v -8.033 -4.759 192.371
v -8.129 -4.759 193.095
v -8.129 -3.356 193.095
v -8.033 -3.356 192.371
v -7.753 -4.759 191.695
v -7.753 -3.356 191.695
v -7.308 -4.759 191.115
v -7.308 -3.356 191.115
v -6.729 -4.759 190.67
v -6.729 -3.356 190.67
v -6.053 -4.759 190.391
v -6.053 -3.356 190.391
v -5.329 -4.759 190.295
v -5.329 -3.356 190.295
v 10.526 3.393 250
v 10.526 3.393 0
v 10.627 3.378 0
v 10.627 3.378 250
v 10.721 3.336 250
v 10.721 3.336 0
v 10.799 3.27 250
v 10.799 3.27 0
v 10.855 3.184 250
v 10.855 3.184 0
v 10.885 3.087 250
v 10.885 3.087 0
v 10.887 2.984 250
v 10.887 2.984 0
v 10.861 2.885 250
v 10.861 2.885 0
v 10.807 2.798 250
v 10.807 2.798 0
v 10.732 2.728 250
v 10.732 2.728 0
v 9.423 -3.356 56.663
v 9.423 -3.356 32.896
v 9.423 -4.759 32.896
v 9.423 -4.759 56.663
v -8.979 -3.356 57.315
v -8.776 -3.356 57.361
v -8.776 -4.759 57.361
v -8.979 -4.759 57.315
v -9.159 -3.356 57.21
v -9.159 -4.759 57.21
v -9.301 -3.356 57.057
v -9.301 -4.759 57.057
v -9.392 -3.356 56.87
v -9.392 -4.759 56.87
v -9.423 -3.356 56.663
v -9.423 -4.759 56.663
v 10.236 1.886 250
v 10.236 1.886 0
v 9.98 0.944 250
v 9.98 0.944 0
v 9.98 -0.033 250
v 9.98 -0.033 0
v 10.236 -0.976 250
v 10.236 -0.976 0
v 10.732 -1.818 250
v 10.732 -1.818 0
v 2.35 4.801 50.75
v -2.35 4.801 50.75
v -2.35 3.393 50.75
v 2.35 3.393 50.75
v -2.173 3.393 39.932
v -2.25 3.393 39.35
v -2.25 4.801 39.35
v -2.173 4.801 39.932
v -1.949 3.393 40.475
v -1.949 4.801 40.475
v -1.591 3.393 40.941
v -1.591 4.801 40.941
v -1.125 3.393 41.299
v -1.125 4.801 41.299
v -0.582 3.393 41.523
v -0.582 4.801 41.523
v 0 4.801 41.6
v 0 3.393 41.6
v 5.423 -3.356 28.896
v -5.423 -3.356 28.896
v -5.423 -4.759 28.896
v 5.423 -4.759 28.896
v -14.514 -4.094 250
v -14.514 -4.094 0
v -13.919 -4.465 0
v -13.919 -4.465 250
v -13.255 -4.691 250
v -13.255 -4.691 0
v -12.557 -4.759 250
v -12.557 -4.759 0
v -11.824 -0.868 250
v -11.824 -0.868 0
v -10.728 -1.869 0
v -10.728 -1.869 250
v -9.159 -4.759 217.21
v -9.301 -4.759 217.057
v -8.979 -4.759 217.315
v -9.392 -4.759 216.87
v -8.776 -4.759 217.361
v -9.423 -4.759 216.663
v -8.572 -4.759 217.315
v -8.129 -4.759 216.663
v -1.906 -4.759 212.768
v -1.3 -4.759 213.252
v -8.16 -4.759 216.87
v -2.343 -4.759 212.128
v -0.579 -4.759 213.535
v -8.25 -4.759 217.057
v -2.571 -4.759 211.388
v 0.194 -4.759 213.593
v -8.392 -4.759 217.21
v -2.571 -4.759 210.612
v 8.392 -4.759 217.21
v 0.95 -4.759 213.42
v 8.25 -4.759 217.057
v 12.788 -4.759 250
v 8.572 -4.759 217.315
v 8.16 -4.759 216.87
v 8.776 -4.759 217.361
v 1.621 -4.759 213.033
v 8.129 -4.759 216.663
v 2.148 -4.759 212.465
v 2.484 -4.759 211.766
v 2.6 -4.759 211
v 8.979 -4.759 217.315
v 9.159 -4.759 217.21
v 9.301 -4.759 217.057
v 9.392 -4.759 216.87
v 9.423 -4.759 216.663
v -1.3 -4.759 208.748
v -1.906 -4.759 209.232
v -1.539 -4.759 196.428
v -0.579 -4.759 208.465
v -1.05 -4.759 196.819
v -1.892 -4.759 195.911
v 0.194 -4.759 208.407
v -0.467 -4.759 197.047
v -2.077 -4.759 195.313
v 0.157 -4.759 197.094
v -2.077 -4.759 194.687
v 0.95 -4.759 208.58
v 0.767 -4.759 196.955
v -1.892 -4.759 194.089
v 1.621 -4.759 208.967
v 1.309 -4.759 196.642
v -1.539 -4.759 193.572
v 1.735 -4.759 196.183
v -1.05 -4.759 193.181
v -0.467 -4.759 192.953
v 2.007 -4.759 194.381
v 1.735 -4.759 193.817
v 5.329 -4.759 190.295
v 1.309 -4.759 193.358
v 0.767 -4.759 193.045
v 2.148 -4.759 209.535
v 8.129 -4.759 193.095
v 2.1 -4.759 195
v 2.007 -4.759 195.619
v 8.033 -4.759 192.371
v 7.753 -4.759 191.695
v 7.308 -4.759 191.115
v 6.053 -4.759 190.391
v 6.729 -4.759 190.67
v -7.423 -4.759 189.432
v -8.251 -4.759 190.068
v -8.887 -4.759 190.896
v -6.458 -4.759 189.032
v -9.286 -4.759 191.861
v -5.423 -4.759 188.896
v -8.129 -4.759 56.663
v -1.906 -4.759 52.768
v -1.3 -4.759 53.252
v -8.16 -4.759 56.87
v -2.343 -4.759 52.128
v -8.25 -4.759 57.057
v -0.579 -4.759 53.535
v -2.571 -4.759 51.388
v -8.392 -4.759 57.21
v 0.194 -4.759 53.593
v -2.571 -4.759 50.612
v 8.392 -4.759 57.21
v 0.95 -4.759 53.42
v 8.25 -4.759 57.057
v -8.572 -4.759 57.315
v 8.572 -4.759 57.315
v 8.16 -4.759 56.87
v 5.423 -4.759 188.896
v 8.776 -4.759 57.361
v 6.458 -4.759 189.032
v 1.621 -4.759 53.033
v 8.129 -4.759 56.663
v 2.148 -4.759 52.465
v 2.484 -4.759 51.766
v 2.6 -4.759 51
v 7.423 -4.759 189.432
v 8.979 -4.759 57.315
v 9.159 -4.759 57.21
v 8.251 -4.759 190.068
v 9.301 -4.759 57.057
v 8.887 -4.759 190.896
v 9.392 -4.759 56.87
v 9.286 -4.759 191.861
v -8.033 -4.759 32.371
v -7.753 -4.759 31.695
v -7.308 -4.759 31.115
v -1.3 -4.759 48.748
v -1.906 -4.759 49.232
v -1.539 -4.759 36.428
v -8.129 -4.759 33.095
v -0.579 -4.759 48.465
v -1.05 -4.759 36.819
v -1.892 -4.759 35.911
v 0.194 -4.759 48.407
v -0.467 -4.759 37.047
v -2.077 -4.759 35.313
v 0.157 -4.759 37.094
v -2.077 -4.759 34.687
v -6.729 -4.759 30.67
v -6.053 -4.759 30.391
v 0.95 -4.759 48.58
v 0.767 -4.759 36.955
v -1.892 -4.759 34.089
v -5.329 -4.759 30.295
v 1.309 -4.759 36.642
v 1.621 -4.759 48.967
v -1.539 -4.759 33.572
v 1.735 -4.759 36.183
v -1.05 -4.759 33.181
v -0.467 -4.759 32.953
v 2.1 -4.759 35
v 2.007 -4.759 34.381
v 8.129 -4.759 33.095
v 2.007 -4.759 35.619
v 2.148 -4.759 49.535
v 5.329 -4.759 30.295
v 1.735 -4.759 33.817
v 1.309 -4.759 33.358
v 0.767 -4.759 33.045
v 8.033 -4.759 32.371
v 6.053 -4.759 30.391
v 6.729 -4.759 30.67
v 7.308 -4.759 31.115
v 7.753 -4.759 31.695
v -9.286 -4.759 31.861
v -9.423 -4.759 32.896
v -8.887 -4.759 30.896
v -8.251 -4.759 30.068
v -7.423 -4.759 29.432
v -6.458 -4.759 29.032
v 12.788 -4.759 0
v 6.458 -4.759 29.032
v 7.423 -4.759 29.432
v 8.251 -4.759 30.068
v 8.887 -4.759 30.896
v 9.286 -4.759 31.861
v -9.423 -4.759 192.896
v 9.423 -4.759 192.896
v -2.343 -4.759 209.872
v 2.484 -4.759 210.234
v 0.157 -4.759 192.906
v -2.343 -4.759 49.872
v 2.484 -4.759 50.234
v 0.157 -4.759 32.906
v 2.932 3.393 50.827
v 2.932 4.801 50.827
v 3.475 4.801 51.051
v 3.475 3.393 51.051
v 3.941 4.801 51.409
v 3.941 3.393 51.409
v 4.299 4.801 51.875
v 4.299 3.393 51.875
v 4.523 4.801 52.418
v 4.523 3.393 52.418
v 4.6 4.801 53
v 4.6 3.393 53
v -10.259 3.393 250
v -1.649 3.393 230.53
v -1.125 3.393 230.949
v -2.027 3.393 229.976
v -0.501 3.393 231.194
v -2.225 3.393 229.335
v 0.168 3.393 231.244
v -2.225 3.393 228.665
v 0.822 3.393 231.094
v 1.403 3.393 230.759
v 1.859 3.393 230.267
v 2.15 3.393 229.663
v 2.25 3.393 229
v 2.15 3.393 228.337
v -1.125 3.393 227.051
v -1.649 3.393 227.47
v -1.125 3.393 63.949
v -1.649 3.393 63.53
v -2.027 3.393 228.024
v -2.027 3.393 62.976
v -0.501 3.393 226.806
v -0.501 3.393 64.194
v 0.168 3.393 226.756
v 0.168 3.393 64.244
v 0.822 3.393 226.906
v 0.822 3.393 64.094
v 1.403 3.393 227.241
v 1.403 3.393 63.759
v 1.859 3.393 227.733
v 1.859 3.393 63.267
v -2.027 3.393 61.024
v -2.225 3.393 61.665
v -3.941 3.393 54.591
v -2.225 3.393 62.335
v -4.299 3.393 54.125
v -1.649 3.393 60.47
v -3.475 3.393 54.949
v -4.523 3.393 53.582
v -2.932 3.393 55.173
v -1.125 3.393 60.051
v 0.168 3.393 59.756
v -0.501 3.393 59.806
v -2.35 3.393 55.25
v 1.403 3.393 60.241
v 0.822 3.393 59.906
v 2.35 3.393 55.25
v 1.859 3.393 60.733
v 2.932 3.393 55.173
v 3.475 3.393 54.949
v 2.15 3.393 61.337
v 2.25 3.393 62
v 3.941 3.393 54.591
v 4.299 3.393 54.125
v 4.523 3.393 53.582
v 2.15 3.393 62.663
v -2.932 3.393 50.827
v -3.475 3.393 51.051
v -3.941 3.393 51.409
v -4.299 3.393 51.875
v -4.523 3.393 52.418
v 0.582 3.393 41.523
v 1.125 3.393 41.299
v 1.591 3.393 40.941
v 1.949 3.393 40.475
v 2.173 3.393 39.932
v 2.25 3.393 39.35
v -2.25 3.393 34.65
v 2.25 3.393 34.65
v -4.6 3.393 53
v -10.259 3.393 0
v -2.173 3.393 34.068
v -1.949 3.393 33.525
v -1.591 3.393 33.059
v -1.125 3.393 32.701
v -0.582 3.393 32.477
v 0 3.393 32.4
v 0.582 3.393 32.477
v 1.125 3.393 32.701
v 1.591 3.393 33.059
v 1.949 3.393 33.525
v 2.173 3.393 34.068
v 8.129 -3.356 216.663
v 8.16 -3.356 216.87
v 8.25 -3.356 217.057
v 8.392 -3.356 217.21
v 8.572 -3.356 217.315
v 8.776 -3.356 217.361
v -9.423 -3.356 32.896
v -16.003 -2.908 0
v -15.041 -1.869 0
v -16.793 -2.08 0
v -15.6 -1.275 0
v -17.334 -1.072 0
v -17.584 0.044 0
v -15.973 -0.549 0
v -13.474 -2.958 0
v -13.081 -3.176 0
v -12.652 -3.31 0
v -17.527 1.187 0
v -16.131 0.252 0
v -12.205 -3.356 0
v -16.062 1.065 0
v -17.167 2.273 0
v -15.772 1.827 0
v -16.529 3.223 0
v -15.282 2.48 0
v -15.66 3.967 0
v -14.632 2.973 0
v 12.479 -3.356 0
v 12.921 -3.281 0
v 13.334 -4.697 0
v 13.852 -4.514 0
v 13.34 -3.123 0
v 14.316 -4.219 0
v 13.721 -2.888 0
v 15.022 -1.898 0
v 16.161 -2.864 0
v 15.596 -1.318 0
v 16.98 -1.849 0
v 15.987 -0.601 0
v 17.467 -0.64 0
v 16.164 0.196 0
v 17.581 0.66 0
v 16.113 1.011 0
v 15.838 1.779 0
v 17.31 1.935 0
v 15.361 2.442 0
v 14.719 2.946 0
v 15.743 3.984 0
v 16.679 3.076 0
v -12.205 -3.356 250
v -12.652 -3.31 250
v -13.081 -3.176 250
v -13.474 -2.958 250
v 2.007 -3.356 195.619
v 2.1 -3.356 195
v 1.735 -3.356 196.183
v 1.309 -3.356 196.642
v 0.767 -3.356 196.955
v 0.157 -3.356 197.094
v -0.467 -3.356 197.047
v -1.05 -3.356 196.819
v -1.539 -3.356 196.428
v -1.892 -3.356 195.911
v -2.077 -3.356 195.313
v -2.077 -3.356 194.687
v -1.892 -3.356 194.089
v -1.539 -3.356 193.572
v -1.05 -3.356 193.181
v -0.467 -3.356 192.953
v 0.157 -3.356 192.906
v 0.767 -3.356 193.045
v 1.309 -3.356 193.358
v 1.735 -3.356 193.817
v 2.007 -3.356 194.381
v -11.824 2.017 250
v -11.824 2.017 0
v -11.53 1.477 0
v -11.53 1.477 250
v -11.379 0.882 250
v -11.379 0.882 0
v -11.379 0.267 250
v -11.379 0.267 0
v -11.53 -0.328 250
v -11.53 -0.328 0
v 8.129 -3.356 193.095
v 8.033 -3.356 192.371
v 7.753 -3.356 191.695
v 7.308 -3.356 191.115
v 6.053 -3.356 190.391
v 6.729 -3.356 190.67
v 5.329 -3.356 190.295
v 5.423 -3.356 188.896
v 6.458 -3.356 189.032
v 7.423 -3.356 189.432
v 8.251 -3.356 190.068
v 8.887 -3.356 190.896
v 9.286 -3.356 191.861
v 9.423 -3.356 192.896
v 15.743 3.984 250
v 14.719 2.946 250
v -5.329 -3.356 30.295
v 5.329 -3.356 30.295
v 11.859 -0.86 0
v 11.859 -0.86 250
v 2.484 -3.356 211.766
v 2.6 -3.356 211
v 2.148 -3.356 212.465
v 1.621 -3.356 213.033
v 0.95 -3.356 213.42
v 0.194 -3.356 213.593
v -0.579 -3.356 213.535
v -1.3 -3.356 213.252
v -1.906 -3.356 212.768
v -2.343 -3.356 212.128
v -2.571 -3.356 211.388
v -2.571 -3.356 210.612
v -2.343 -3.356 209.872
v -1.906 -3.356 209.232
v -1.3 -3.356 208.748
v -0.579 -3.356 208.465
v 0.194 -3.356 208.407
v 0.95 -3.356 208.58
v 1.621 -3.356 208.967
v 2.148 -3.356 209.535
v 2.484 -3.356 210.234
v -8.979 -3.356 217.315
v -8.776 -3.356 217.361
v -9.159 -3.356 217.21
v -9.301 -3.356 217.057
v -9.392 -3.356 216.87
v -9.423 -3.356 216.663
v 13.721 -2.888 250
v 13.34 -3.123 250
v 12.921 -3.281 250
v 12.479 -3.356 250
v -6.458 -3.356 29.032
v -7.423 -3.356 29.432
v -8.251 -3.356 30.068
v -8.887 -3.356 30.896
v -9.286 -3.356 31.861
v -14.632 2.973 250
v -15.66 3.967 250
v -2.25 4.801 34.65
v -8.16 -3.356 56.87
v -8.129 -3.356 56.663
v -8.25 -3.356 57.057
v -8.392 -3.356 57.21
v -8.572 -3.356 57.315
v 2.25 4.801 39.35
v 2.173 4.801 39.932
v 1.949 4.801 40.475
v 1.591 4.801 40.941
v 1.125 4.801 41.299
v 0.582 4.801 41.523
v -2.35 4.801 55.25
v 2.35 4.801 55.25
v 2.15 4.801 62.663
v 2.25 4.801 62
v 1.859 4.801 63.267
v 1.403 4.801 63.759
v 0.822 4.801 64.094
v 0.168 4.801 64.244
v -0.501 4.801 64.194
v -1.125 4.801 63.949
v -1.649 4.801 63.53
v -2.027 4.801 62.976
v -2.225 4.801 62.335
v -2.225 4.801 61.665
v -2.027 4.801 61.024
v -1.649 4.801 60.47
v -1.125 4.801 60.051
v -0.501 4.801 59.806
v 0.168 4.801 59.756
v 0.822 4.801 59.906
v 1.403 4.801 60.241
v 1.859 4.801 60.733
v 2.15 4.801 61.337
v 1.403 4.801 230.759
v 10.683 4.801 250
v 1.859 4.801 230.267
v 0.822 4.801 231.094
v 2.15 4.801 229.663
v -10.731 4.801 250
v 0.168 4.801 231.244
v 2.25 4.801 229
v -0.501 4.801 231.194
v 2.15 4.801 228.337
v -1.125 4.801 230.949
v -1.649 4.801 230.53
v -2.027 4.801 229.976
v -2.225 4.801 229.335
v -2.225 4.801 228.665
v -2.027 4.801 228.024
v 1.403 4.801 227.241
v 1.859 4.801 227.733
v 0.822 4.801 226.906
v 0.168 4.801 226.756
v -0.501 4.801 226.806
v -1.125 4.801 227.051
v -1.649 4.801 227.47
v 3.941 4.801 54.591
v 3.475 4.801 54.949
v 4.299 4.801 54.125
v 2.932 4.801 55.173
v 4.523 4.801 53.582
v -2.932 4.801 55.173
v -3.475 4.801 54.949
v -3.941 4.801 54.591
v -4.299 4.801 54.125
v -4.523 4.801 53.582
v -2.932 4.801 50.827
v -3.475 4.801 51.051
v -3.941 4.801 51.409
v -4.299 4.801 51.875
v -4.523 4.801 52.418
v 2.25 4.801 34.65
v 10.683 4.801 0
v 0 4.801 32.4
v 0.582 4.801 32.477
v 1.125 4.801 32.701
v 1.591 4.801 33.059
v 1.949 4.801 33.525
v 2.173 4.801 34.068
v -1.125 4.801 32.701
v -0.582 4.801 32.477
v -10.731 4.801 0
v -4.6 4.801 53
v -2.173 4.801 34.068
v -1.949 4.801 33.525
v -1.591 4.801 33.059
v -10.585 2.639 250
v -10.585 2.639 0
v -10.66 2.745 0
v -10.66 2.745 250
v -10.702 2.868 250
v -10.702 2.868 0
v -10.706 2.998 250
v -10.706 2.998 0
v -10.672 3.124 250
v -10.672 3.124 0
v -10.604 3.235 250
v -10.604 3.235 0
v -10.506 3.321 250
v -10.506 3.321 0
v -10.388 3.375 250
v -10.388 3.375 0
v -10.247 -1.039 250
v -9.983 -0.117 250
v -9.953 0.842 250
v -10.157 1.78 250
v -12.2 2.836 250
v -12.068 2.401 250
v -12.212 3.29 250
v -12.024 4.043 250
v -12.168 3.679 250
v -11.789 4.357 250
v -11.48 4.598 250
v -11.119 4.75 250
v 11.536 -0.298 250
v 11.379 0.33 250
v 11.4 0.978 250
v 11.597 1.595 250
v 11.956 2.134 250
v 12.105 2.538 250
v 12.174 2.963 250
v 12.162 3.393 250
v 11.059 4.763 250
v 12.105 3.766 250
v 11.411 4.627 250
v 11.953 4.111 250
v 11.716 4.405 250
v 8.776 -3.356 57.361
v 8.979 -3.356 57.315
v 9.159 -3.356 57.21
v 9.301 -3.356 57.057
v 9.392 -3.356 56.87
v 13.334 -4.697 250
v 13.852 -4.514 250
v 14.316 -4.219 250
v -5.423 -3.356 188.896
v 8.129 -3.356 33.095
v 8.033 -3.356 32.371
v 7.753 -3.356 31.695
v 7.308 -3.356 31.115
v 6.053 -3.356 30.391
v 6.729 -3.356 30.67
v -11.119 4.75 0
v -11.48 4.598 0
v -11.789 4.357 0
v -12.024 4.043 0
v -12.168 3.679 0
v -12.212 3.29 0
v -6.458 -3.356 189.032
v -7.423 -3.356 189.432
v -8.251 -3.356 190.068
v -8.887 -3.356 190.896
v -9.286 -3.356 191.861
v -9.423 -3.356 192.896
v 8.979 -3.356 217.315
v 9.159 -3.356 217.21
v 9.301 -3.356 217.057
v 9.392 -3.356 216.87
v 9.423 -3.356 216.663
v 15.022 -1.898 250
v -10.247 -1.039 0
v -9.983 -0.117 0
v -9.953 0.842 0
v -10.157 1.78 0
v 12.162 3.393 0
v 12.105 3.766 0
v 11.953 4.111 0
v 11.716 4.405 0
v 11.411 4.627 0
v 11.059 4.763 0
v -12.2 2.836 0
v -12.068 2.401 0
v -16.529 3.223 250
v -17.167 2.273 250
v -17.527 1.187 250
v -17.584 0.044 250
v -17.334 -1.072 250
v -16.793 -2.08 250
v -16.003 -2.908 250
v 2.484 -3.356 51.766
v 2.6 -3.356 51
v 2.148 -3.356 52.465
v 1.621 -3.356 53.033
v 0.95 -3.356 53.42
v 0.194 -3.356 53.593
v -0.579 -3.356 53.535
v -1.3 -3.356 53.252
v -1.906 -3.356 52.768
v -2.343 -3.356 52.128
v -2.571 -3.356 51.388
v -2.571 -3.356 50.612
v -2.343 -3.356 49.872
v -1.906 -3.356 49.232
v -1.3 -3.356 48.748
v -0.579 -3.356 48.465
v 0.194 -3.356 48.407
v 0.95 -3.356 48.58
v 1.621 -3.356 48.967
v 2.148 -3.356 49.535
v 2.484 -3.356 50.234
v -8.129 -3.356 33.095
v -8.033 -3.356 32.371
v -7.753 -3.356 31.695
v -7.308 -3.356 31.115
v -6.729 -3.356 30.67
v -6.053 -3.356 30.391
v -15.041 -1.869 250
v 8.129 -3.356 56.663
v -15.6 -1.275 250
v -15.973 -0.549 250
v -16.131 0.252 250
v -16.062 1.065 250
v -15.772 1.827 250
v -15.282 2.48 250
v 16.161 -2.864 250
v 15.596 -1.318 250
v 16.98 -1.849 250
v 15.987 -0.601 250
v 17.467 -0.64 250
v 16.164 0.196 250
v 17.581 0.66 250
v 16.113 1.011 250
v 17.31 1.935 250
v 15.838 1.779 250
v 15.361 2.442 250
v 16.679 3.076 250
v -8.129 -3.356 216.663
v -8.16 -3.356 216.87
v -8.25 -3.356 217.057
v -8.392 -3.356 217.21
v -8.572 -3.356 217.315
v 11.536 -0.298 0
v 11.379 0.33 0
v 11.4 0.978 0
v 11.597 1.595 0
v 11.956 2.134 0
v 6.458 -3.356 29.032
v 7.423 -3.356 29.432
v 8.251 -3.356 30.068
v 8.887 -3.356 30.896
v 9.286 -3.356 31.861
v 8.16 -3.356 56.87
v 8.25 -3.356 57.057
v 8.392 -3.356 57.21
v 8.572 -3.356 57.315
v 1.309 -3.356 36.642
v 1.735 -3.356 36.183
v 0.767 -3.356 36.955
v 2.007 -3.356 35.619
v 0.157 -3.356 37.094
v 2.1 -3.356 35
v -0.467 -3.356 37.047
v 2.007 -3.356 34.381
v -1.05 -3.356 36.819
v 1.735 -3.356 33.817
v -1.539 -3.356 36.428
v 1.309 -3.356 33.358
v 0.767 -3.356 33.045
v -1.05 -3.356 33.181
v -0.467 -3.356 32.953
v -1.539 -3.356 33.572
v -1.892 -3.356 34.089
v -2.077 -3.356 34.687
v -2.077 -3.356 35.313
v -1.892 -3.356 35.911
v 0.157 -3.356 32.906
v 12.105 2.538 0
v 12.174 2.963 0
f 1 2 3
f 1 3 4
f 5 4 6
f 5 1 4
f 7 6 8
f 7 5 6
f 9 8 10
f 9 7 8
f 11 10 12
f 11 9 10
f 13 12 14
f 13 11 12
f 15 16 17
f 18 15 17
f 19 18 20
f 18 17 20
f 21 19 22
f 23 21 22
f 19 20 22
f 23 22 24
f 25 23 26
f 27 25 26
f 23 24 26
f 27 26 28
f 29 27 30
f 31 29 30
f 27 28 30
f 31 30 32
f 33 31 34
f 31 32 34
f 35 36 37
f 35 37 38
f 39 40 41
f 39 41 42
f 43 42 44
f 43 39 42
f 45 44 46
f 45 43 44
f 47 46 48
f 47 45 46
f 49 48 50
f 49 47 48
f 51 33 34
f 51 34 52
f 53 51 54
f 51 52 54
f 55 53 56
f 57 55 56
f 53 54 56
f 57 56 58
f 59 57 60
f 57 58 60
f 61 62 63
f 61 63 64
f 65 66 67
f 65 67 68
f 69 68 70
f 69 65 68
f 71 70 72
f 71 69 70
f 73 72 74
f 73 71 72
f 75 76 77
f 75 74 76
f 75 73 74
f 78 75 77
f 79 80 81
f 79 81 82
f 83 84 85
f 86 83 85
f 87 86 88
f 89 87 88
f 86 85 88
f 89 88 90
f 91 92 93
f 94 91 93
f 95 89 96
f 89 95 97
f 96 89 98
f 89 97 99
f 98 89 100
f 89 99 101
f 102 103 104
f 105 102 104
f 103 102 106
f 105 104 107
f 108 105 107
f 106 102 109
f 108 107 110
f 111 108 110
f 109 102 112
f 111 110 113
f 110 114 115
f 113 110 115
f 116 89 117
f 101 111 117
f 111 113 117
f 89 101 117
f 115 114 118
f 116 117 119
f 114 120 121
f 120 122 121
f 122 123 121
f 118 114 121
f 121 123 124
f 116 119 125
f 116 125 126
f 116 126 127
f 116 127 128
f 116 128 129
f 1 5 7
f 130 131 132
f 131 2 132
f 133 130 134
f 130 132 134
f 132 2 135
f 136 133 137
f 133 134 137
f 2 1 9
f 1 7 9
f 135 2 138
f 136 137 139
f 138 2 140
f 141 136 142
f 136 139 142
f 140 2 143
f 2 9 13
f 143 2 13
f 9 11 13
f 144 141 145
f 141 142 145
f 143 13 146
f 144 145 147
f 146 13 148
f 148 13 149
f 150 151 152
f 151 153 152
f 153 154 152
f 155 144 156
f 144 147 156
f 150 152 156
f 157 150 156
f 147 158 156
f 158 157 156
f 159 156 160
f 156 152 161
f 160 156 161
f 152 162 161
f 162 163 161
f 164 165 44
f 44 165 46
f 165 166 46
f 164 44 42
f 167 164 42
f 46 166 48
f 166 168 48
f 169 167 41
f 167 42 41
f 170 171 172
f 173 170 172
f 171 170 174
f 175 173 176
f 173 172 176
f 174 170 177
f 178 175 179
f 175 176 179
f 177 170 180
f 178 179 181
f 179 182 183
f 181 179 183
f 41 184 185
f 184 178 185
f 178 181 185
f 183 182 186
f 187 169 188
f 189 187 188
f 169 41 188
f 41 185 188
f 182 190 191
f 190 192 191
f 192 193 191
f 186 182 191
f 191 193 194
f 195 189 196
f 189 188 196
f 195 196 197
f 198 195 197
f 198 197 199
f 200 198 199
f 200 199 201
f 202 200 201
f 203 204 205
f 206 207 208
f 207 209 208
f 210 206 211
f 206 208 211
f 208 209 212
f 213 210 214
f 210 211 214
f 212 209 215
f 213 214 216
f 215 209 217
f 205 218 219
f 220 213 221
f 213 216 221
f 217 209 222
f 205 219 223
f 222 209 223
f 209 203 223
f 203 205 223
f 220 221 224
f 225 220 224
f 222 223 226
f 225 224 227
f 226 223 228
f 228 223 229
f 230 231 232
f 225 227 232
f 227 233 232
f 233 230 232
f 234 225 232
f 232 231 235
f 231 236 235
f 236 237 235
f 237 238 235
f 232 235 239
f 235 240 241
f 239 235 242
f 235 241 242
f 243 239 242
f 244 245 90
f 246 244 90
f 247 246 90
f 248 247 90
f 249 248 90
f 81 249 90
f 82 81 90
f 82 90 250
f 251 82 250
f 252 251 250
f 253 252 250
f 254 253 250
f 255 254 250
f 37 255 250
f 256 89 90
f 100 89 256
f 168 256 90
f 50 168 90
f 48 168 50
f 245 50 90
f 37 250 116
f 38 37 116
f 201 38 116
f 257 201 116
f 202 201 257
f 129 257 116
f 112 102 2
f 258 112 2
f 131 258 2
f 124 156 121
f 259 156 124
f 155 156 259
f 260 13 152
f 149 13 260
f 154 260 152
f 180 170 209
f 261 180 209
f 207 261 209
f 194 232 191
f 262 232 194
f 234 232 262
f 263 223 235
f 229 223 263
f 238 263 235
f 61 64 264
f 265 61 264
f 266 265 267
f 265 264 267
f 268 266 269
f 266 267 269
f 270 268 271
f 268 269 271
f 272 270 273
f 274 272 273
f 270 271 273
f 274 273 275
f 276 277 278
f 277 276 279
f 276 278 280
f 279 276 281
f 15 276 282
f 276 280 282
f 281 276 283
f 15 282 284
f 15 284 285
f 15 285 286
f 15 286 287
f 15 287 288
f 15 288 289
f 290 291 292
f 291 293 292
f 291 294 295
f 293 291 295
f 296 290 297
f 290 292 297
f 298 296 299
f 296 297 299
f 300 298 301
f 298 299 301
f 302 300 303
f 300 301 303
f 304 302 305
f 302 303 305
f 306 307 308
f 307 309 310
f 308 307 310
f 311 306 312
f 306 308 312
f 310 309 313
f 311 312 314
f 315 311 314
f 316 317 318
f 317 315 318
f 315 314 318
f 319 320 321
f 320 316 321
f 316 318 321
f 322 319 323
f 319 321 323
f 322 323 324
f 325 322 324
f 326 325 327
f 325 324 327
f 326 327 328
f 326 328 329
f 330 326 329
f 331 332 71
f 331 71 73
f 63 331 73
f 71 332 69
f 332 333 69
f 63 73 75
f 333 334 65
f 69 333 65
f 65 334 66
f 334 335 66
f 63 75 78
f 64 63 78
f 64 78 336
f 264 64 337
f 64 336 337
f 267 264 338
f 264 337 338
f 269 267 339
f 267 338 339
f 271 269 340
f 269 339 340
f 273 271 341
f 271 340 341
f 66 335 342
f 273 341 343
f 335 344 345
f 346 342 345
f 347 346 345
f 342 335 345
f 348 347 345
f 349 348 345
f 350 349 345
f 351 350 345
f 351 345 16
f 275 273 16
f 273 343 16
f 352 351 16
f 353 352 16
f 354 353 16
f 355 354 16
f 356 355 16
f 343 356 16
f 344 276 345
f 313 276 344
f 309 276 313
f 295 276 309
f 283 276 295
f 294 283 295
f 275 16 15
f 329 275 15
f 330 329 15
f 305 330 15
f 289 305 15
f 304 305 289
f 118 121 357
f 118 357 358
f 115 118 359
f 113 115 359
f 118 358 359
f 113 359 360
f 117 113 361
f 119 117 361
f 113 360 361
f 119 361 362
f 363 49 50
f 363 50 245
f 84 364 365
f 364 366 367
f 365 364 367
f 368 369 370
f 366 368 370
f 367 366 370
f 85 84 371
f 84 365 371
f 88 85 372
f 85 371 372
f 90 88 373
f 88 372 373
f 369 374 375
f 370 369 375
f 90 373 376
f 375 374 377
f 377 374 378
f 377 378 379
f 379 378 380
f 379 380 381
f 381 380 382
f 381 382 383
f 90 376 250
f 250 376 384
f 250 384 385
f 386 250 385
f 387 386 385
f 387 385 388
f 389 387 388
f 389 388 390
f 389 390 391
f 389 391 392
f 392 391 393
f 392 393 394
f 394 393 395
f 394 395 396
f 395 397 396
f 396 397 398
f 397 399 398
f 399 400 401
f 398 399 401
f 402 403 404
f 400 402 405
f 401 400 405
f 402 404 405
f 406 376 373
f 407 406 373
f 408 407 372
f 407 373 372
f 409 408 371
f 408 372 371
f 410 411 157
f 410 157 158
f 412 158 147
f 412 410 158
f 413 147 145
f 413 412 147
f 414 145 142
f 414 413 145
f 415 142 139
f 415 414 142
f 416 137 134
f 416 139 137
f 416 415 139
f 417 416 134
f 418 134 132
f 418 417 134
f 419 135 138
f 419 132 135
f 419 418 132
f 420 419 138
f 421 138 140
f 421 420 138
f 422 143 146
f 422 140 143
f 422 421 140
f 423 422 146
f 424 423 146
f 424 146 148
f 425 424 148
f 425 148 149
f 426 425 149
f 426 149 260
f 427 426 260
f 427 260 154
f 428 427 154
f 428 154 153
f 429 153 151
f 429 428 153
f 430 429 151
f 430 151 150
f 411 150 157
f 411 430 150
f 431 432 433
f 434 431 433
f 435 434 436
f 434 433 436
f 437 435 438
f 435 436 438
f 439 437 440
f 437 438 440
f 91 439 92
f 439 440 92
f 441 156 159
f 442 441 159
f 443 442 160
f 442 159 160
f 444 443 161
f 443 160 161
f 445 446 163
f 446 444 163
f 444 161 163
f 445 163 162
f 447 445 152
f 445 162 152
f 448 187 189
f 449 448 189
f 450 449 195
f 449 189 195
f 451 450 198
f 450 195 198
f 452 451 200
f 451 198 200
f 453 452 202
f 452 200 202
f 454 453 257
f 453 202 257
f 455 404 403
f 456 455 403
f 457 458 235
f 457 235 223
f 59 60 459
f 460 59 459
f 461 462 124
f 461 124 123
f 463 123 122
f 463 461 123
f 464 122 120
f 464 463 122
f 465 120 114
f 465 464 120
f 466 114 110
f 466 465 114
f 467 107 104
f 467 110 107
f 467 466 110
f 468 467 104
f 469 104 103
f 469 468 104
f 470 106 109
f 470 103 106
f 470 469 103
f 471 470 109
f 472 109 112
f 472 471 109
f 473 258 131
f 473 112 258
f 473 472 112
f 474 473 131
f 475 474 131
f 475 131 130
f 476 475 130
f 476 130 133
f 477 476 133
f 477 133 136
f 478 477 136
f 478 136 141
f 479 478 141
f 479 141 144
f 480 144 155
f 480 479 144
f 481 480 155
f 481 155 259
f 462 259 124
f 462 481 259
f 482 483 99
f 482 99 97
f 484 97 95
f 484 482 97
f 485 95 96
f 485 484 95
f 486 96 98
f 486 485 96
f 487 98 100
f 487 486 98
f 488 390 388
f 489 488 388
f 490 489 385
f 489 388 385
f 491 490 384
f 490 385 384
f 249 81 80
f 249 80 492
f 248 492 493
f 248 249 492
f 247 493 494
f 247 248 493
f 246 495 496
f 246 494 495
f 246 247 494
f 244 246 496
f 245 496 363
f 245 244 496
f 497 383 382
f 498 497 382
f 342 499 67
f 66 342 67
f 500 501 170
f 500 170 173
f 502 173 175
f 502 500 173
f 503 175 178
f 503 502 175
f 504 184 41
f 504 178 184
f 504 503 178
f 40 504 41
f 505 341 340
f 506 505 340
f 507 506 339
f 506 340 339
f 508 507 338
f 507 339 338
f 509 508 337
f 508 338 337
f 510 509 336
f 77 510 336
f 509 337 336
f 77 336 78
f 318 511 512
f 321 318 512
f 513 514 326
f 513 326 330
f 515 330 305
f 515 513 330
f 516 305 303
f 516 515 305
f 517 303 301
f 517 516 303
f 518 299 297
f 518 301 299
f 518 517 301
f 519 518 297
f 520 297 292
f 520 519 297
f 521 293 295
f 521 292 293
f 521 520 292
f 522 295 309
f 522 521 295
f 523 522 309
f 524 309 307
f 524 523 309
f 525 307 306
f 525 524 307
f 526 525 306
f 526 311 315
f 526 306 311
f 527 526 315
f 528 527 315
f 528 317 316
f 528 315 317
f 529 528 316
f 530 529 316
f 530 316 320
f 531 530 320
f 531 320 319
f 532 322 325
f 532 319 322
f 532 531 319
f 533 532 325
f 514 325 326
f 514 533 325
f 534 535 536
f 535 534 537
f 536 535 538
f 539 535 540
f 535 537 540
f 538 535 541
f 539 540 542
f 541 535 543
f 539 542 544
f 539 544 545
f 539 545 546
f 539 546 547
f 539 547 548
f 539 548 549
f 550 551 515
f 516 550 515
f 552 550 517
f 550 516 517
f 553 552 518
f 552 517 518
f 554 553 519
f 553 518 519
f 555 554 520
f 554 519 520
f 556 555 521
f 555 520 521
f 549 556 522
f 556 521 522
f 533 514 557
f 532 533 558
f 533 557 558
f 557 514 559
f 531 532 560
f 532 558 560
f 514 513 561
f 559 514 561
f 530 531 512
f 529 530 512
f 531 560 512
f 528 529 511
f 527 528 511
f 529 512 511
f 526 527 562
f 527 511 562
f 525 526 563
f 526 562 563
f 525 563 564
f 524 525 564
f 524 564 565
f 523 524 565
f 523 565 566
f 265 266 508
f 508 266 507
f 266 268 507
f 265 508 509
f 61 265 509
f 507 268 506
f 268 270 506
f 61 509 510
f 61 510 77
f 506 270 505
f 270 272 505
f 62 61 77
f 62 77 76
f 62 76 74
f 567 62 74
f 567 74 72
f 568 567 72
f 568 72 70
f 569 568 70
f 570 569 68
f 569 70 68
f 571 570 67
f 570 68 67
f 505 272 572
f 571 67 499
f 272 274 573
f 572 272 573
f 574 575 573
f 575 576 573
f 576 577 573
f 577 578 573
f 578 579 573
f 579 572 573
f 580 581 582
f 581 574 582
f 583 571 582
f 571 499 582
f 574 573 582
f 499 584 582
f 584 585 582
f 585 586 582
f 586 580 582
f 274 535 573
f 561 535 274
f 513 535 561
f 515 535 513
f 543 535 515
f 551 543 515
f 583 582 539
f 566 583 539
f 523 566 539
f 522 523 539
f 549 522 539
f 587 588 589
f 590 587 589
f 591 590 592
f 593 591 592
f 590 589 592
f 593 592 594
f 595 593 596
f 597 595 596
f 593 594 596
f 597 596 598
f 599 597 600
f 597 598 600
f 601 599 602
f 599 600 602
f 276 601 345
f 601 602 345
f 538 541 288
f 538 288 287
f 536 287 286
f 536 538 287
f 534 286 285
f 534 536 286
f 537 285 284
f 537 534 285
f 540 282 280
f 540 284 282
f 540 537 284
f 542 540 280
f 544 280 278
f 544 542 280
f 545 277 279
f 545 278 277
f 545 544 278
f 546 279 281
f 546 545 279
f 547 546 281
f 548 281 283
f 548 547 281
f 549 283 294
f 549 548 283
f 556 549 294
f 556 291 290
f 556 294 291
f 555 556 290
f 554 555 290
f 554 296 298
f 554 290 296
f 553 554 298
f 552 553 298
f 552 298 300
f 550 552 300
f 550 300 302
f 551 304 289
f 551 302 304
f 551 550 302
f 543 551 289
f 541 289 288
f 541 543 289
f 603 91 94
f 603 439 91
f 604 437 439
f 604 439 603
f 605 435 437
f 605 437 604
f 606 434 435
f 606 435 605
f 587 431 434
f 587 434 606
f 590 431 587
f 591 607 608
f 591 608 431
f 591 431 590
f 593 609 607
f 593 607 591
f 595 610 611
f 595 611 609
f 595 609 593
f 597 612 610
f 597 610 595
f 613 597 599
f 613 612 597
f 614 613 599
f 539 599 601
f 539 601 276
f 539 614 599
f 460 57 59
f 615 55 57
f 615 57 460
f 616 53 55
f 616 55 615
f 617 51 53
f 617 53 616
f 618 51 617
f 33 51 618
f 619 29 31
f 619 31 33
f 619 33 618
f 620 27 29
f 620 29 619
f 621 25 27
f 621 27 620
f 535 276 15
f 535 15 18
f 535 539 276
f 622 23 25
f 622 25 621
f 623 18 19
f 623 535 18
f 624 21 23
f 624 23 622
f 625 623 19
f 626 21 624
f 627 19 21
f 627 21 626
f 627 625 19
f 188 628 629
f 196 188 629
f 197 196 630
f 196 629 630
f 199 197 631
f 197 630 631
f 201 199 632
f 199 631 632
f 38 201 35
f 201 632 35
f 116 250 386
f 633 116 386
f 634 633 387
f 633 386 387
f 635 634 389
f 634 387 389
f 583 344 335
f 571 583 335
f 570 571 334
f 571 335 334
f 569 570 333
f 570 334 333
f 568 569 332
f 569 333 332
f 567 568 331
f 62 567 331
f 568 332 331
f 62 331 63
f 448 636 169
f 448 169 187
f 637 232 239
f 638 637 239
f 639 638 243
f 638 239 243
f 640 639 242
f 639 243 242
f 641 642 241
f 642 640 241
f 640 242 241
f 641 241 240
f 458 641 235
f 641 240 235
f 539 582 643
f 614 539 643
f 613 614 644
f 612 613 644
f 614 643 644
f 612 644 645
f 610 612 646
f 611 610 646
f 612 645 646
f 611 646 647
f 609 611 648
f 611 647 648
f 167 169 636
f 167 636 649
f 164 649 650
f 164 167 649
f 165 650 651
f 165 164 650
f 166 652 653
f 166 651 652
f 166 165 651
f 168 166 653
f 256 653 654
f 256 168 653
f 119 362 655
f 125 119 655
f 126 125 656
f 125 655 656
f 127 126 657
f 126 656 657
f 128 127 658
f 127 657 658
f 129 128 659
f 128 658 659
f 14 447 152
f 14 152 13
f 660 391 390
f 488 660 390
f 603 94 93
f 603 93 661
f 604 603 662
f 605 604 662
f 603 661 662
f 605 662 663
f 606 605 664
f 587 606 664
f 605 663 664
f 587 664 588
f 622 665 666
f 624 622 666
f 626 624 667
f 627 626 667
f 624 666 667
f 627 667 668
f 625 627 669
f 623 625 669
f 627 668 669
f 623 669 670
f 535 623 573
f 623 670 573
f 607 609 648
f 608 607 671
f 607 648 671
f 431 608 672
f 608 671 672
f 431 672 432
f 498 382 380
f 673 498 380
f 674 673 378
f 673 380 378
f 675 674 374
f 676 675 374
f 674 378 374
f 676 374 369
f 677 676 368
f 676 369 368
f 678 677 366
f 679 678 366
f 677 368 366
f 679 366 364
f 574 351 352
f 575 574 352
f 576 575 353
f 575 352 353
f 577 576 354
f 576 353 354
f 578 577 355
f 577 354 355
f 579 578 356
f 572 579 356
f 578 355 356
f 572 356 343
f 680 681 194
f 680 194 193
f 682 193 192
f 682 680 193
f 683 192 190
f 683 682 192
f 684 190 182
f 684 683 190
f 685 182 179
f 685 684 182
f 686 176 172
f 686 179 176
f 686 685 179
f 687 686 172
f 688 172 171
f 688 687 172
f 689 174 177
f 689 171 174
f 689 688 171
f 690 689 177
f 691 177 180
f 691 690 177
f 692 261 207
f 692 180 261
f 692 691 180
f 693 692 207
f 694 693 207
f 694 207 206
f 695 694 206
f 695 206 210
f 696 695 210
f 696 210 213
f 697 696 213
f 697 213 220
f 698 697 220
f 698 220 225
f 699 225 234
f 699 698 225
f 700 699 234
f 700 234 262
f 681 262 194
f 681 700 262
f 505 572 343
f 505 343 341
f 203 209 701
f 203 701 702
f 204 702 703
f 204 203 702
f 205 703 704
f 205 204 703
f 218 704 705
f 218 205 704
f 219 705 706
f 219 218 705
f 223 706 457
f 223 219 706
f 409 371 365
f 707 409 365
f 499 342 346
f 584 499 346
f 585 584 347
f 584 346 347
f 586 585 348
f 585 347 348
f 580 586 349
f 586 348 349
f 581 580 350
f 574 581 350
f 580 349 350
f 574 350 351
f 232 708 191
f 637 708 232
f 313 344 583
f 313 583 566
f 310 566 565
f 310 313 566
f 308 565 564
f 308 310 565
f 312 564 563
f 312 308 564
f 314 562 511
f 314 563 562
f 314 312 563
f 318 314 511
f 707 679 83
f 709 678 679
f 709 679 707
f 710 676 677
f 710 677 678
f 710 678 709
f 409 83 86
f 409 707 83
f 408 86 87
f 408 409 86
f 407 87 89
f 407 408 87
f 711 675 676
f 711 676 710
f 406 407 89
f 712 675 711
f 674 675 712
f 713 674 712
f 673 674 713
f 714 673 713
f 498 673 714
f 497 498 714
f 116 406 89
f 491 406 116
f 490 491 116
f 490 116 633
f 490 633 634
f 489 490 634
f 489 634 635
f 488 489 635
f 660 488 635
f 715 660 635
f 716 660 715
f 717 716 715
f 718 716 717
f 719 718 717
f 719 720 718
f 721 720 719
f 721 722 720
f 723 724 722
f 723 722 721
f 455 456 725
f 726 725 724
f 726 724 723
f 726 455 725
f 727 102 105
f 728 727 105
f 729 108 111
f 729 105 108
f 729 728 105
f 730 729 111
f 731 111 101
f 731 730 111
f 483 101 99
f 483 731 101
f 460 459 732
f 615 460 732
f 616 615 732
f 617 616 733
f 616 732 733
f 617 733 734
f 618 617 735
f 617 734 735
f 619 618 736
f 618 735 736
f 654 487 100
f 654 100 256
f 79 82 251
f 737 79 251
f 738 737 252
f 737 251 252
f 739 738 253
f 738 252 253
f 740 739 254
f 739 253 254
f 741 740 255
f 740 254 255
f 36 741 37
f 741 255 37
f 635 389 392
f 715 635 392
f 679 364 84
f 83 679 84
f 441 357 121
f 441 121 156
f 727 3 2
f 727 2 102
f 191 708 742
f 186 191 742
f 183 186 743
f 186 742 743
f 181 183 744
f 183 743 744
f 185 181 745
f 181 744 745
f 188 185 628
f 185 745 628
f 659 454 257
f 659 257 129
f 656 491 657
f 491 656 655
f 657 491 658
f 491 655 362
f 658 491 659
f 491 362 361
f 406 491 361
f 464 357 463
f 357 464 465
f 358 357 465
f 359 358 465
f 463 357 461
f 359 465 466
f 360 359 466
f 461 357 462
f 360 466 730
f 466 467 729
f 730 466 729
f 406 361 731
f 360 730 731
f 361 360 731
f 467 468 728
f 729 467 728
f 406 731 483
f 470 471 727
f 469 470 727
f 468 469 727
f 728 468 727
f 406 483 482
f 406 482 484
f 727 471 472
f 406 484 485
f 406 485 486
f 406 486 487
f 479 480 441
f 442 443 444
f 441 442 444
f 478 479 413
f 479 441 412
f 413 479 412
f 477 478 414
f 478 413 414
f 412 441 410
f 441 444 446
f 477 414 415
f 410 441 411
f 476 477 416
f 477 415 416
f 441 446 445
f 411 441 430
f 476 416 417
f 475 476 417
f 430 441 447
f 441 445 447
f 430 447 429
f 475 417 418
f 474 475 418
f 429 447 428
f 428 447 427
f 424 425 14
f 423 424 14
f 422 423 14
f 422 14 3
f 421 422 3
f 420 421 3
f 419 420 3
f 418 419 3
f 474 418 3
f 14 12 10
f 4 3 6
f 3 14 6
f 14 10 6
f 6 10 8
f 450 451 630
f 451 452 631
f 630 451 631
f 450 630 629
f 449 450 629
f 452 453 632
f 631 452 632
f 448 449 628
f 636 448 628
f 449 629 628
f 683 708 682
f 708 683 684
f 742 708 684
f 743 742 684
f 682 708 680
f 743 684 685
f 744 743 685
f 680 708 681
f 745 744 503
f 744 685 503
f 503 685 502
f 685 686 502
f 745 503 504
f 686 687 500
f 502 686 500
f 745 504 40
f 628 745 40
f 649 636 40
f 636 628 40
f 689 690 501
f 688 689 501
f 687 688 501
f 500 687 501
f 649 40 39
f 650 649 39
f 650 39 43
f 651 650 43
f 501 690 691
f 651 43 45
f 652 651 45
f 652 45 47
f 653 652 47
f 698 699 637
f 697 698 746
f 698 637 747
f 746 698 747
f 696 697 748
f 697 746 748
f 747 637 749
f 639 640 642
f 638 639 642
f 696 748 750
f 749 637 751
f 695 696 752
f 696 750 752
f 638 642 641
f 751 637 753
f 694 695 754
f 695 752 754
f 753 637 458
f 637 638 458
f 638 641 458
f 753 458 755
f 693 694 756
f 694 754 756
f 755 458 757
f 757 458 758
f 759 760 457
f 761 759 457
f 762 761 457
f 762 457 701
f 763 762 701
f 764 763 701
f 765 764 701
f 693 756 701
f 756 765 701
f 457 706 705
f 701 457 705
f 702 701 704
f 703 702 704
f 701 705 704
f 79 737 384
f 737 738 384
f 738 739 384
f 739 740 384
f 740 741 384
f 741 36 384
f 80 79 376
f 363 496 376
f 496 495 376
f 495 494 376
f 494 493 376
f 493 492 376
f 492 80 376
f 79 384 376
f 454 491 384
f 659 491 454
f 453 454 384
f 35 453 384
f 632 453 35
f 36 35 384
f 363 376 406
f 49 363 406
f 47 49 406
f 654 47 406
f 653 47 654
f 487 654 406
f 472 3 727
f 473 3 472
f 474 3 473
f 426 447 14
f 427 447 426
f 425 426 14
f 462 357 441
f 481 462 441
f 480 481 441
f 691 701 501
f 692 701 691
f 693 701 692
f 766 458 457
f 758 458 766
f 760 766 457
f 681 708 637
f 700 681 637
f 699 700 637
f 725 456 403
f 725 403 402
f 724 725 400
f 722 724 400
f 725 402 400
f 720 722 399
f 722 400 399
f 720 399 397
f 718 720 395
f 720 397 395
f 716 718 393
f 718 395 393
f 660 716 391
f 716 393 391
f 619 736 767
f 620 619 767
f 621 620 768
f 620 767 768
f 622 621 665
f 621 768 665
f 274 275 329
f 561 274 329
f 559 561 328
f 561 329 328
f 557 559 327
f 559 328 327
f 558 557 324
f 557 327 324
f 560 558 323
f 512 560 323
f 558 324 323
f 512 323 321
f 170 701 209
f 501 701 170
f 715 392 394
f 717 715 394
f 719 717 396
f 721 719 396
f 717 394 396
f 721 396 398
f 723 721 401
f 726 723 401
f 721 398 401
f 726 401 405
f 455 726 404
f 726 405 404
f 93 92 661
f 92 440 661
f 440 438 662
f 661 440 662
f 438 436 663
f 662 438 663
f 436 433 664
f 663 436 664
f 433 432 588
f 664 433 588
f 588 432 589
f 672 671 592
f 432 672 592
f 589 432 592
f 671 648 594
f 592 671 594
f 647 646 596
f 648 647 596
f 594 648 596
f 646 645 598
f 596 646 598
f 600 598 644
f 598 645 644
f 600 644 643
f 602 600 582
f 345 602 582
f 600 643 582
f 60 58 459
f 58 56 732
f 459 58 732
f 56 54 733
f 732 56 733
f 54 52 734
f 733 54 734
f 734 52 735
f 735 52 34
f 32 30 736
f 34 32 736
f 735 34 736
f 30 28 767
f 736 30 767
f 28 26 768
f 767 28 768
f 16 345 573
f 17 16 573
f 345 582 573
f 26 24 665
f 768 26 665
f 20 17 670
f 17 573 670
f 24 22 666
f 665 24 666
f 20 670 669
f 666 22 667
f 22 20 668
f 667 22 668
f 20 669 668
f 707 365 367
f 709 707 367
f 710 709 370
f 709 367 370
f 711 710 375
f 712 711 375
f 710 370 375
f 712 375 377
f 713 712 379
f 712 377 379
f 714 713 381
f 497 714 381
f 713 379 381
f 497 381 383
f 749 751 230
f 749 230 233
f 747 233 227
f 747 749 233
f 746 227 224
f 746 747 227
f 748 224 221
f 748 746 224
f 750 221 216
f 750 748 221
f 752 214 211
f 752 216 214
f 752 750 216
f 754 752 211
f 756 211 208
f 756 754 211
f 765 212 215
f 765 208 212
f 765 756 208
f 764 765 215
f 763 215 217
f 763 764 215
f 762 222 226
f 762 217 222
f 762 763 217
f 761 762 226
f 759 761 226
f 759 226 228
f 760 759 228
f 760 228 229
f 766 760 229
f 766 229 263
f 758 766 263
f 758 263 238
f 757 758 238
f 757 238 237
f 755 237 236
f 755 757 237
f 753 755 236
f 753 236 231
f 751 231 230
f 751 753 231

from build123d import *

# Parameters (mm, degrees)
F2_DEPTH     = 250
F3_DEPTH     = 250
F4_W         = 4.5
F4_H         = 9.2
F5_DEPTH     = 25
F4_W_2       = 9.2
F4_H_2       = 4.5
F4_R         = 2.25
F8_R         = 2.24999
F8_2_R       = 2.24999
F14_DEPTH    = 6
F13_R        = 2.1
F13_R_2      = 2.6
F15_R        = 4
F16_R        = 2.8
F17_T1_DEPTH = 9.5


# Not quite as in the source:
# - a fillet or chamfer that OpenCascade refuses, or shapes differently, is made with other operations: its cross-section is extruded or revolved along the edge and cut away or added
# - a fillet or chamfer is up to 0.001 mm smaller than in the source, because OpenCascade refuses the exact size


with BuildPart() as f2:
    # F1 (on Top) → F2 (new body)
    with BuildSketch(Plane.XY):
        with BuildLine():
            Line((-11.8238357827, -0.8677195292), (-10.7275778428, -1.8694410791))
            ThreePointArc((-10.7275778428, -1.8694410791), (-9.9382011717, 0.3618114698), (-10.5848610401, 2.6385271922))
            ThreePointArc((-10.5848610401, 2.6385271922), (-10.6721948967, 3.1240050413), (-10.2586513385, 3.3928873017))
            Line((-10.2586513385, 3.3928873017), (10.5257425457, 3.3928873017))
            ThreePointArc((10.5257425457, 3.3928873017), (10.8736199043, 3.1365507058), (10.731831193, 2.7283558156))
            ThreePointArc((10.731831193, 2.7283558156), (9.9471667751, 0.455322268), (10.731831193, -1.8177112797))
            Line((10.731831193, -1.8177112797), (11.8592558429, -0.8600065485))
            ThreePointArc((11.8592558429, -0.8600065485), (11.3668469211, 0.6546838766), (11.9562381878, 2.1343363915))
            ThreePointArc((11.9562381878, 2.1343363915), (12.1496041237, 2.7488216154), (12.1623268351, 3.3928873017))
            ThreePointArc((12.1623268351, 3.3928873017), (11.7162853066, 4.4052676185), (10.6833400205, 4.8013622873))
            Line((10.6833400205, 4.8013622873), (-10.7308318838, 4.8013622873))
            ThreePointArc((-10.7308318838, 4.8013622873), (-11.7888176914, 4.3568184571), (-12.2117670253, 3.2900162041))
            ThreePointArc((-12.2117670253, 3.2900162041), (-12.1485508104, 2.6137193167), (-11.8238357827, 2.0171173383))
            ThreePointArc((-11.8238357827, 2.0171173383), (-11.3595728447, 0.5746989045), (-11.8238357827, -0.8677195292))
        make_face()
    extrude(amount=F2_DEPTH)


with BuildPart() as f3:
    # F1 (on Top) → F3 (new body)
    with BuildSketch(Plane.XY):
        with BuildLine():
            ThreePointArc((-15.040784136, -1.8694410791), (-16.1252354526, 0.6606326234), (-14.6316215396, 2.9728664085))
            Line((-14.6316215396, 2.9728664085), (-15.6602784991, 3.9672353305))
            ThreePointArc((-15.6602784991, 3.9672353305), (-17.5947215903, 0.617735278), (-16.0031653941, -2.9076256324))
            Line((-16.0031653941, -2.9076256324), (-14.5143490806, -4.0940172111))
            ThreePointArc((-14.5143490806, -4.0940172111), (-13.5937394916, -4.5972187997), (-12.5571619719, -4.7592092305))
            Line((-12.5571619719, -4.7592092305), (12.7876326442, -4.7592092305))
            ThreePointArc((12.7876326442, -4.7592092305), (13.5980508192, -4.6201771633), (14.3157895654, -4.21898067))
            Line((14.3157895654, -4.21898067), (16.1611102521, -2.863822272))
            ThreePointArc((16.1611102521, -2.863822272), (17.5805681578, 0.6595379776), (15.7430302352, 3.9840503596))
            Line((15.7430302352, 3.9840503596), (14.7194536403, 2.9460568912))
            ThreePointArc((14.7194536403, 2.9460568912), (16.1669970409, 0.6050832532), (15.0222023949, -1.8979118904))
            Line((15.0222023949, -1.8979118904), (13.7213492466, -2.8877414463))
            ThreePointArc((13.7213492466, -2.8877414463), (13.1343028227, -3.2124911979), (12.4788619578, -3.35561065))
            Line((12.4788619578, -3.35561065), (-12.2050791979, -3.35561065))
            ThreePointArc((-12.2050791979, -3.35561065), (-12.8698089882, -3.2539225108), (-13.4737379849, -2.9581591953))
            Line((-13.4737379849, -2.9581591953), (-15.040784136, -1.8694410791))
        make_face()
    extrude(amount=F3_DEPTH)


with BuildPart() as f5:
    # F4 (on face) → F5 (new body)
    with BuildSketch(Plane.XZ.offset(4.7592092305)):
        with Locations((0, 37)):
            Rectangle(F4_W, F4_H)
    extrude(amount=F5_DEPTH)


with BuildPart() as f5b:
    # F4 (on face) → F5, piece 2 (new body)
    with BuildSketch(Plane.XZ.offset(4.7592092305)):
        with Locations((0, 53)):
            Rectangle(F4_W_2, F4_H_2)
    extrude(amount=F5_DEPTH)


with BuildPart() as f5c:
    # F4 (on face) → F5, piece 3 (new body)
    with BuildSketch(Plane.XZ.offset(4.7592092305)):
        with Locations((0, 62)):
            Circle(F4_R)
    extrude(amount=F5_DEPTH)


with BuildPart() as f5d:
    # F4 (on face) → F5, piece 4 (new body)
    with BuildSketch(Plane.XZ.offset(4.7592092305)):
        with Locations((0, 229)):
            Circle(F4_R)
    extrude(amount=F5_DEPTH)


with BuildPart() as f5d_1:
    # F6: moved
    add(f5d.part.moved(Location((0, 29, 0))))


with BuildPart() as f5c_1:
    # F6: moved
    add(f5c.part.moved(Location((0, 29, 0))))


with BuildPart() as f5b_1:
    # F6: moved
    add(f5b.part.moved(Location((0, 29, 0))))


with BuildPart() as f5_1:
    # F6: moved
    add(f5.part.moved(Location((0, 29, 0))))


with BuildPart() as f5d_2:
    # F7: moved
    add(f5d_1.part.moved(Location((0, 2.4, 0))))


with BuildPart() as f5c_2:
    # F7: moved
    add(f5c_1.part.moved(Location((0, 2.4, 0))))


with BuildPart() as f5b_2:
    # F7: moved
    add(f5b_1.part.moved(Location((0, 2.4, 0))))

    # F8 (radius 2.25 in the source; OpenCascade refuses exactly that, so slightly less here)
    f8_edges = [f5b_2.edges().sort_by_distance(p)[0] for p in [
        (-4.6, 14.140791, 50.75),
        (4.6, 14.140791, 50.75),
        (-4.6, 14.140791, 55.25),
        (4.6, 14.140791, 55.25),
    ]]
    fillet(f8_edges, radius=F8_R)


with BuildPart() as f5_2:
    # F7: moved
    add(f5_1.part.moved(Location((0, 2.4, 0))))

    # F8#2 (radius 2.25 in the source; OpenCascade refuses exactly that, so slightly less here)
    f8_2_edges = [f5_2.edges().sort_by_distance(p)[0] for p in [
        (-2.25, 14.140791, 41.6),
        (-2.25, 14.140791, 32.4),
        (2.25, 14.140791, 32.4),
        (2.25, 14.140791, 41.6),
    ]]
    fillet(f8_2_edges, radius=F8_2_R)


with BuildPart() as f2_1:
    add(f2.part)

    # F9: cut F5
    add(f5_2.part, mode=Mode.SUBTRACT)

    # F10: cut F5d
    add(f5d_2.part, mode=Mode.SUBTRACT)

    # F11: cut F5b
    add(f5b_2.part, mode=Mode.SUBTRACT)

    # F12: cut F5c
    add(f5c_2.part, mode=Mode.SUBTRACT)


with BuildPart() as f14:
    # F13 (on Front) → F14 (new body)
    with BuildSketch(Plane.XZ):
        Polygon((-9.4226980582, 28.8961585611), (0, 28.8961585611), (0, 30.2952826023), (-8.1285946071, 30.2952826023), (-8.1285946071, 57.3633499444), (-9.4226980582, 57.3633499444), align=None)
        Polygon((0, 30.2952826023), (0, 28.8961585611), (9.4226980582, 28.8961585611), (9.4226980582, 57.3633499444), (8.1285946071, 57.3633499444), (8.1285946071, 30.2952826023), align=None)
    extrude(amount=F14_DEPTH)

    # F15
    f15_edges = [f14.edges().sort_by_distance(p)[0] for p in [
        (9.422698, -3, 28.896159),
        (-9.422698, -3, 28.896159),
    ]]
    fillet(f15_edges, radius=F15_R)

    # F16
    f16_edges = [f14.edges().sort_by_distance(p)[0] for p in [
        (-8.128595, -3, 30.295283),
        (8.128595, -3, 30.295283),
    ]]
    fillet(f16_edges, radius=F16_R)

    # F17: fillet of radius 0.7 on 4 edges, made by hand

    # F17_s2 → F17_t1 (cut)
    with BuildSketch(Plane.XZ.offset(-1.75)):
        with BuildLine():
            ThreePointArc((-8.1285946071, 56.6633499444), (-8.3336198603, 57.1583246912), (-8.8285946071, 57.3633499444))
            Line((-8.8285946071, 57.3633499444), (-8.1285946071, 57.3633499444))
            Line((-8.1285946071, 57.3633499444), (-8.1285946071, 56.6633499444))
        make_face()
        with BuildLine():
            ThreePointArc((-8.7226980582, 57.3633499444), (-9.217672805, 57.1583246912), (-9.4226980582, 56.6633499444))
            Line((-9.4226980582, 56.6633499444), (-9.4226980582, 57.3633499444))
            Line((-9.4226980582, 57.3633499444), (-8.7226980582, 57.3633499444))
        make_face()
        with BuildLine():
            ThreePointArc((8.1285946071, 56.6633499444), (8.3336198603, 57.1583246912), (8.8285946071, 57.3633499444))
            Line((8.8285946071, 57.3633499444), (8.1285946071, 57.3633499444))
            Line((8.1285946071, 57.3633499444), (8.1285946071, 56.6633499444))
        make_face()
        with BuildLine():
            ThreePointArc((8.7226980582, 57.3633499444), (9.217672805, 57.1583246912), (9.4226980582, 56.6633499444))
            Line((9.4226980582, 56.6633499444), (9.4226980582, 57.3633499444))
            Line((9.4226980582, 57.3633499444), (8.7226980582, 57.3633499444))
        make_face()
    extrude(amount=F17_T1_DEPTH, mode=Mode.SUBTRACT)


with BuildPart() as f14b:
    # F13 (on Front) → F14, piece 2 (new body)
    with BuildSketch(Plane.XZ):
        with Locations((0, 35)):
            Circle(F13_R)
    extrude(amount=F14_DEPTH)


with BuildPart() as f14c:
    # F13 (on Front) → F14, piece 3 (new body)
    with BuildSketch(Plane.XZ):
        with Locations((0, 51)):
            Circle(F13_R_2)
    extrude(amount=F14_DEPTH)


with BuildPart() as f18_1:
    # F18: copy of F14b
    add(f14b.part.moved(Location((0, 0, 97))))


with BuildPart() as f18_2:
    # F18: copy of F14c
    add(f14c.part.moved(Location((0, 0, 97))))


with BuildPart() as f18_3:
    # F18: copy of F14
    add(f14.part.moved(Location((0, 0, 97))))


with BuildPart() as f18_2_1:
    # F19: moved
    add(f18_2.part.moved(Location((0, 0, 63))))


with BuildPart() as f18_1_1:
    # F19: moved
    add(f18_1.part.moved(Location((0, 0, 63))))


with BuildPart() as f18_3_1:
    # F19: moved
    add(f18_3.part.moved(Location((0, 0, 63))))


with BuildPart() as f3_1:
    add(f3.part)

    # F20: cut F18_1, F14, F14c, F18_2, F18_3, F14b
    add(f18_1_1.part, mode=Mode.SUBTRACT)
    add(f14.part, mode=Mode.SUBTRACT)
    add(f14c.part, mode=Mode.SUBTRACT)
    add(f18_2_1.part, mode=Mode.SUBTRACT)
    add(f18_3_1.part, mode=Mode.SUBTRACT)
    add(f14b.part, mode=Mode.SUBTRACT)


solid = Compound([f2_1.part, f3_1.part])
